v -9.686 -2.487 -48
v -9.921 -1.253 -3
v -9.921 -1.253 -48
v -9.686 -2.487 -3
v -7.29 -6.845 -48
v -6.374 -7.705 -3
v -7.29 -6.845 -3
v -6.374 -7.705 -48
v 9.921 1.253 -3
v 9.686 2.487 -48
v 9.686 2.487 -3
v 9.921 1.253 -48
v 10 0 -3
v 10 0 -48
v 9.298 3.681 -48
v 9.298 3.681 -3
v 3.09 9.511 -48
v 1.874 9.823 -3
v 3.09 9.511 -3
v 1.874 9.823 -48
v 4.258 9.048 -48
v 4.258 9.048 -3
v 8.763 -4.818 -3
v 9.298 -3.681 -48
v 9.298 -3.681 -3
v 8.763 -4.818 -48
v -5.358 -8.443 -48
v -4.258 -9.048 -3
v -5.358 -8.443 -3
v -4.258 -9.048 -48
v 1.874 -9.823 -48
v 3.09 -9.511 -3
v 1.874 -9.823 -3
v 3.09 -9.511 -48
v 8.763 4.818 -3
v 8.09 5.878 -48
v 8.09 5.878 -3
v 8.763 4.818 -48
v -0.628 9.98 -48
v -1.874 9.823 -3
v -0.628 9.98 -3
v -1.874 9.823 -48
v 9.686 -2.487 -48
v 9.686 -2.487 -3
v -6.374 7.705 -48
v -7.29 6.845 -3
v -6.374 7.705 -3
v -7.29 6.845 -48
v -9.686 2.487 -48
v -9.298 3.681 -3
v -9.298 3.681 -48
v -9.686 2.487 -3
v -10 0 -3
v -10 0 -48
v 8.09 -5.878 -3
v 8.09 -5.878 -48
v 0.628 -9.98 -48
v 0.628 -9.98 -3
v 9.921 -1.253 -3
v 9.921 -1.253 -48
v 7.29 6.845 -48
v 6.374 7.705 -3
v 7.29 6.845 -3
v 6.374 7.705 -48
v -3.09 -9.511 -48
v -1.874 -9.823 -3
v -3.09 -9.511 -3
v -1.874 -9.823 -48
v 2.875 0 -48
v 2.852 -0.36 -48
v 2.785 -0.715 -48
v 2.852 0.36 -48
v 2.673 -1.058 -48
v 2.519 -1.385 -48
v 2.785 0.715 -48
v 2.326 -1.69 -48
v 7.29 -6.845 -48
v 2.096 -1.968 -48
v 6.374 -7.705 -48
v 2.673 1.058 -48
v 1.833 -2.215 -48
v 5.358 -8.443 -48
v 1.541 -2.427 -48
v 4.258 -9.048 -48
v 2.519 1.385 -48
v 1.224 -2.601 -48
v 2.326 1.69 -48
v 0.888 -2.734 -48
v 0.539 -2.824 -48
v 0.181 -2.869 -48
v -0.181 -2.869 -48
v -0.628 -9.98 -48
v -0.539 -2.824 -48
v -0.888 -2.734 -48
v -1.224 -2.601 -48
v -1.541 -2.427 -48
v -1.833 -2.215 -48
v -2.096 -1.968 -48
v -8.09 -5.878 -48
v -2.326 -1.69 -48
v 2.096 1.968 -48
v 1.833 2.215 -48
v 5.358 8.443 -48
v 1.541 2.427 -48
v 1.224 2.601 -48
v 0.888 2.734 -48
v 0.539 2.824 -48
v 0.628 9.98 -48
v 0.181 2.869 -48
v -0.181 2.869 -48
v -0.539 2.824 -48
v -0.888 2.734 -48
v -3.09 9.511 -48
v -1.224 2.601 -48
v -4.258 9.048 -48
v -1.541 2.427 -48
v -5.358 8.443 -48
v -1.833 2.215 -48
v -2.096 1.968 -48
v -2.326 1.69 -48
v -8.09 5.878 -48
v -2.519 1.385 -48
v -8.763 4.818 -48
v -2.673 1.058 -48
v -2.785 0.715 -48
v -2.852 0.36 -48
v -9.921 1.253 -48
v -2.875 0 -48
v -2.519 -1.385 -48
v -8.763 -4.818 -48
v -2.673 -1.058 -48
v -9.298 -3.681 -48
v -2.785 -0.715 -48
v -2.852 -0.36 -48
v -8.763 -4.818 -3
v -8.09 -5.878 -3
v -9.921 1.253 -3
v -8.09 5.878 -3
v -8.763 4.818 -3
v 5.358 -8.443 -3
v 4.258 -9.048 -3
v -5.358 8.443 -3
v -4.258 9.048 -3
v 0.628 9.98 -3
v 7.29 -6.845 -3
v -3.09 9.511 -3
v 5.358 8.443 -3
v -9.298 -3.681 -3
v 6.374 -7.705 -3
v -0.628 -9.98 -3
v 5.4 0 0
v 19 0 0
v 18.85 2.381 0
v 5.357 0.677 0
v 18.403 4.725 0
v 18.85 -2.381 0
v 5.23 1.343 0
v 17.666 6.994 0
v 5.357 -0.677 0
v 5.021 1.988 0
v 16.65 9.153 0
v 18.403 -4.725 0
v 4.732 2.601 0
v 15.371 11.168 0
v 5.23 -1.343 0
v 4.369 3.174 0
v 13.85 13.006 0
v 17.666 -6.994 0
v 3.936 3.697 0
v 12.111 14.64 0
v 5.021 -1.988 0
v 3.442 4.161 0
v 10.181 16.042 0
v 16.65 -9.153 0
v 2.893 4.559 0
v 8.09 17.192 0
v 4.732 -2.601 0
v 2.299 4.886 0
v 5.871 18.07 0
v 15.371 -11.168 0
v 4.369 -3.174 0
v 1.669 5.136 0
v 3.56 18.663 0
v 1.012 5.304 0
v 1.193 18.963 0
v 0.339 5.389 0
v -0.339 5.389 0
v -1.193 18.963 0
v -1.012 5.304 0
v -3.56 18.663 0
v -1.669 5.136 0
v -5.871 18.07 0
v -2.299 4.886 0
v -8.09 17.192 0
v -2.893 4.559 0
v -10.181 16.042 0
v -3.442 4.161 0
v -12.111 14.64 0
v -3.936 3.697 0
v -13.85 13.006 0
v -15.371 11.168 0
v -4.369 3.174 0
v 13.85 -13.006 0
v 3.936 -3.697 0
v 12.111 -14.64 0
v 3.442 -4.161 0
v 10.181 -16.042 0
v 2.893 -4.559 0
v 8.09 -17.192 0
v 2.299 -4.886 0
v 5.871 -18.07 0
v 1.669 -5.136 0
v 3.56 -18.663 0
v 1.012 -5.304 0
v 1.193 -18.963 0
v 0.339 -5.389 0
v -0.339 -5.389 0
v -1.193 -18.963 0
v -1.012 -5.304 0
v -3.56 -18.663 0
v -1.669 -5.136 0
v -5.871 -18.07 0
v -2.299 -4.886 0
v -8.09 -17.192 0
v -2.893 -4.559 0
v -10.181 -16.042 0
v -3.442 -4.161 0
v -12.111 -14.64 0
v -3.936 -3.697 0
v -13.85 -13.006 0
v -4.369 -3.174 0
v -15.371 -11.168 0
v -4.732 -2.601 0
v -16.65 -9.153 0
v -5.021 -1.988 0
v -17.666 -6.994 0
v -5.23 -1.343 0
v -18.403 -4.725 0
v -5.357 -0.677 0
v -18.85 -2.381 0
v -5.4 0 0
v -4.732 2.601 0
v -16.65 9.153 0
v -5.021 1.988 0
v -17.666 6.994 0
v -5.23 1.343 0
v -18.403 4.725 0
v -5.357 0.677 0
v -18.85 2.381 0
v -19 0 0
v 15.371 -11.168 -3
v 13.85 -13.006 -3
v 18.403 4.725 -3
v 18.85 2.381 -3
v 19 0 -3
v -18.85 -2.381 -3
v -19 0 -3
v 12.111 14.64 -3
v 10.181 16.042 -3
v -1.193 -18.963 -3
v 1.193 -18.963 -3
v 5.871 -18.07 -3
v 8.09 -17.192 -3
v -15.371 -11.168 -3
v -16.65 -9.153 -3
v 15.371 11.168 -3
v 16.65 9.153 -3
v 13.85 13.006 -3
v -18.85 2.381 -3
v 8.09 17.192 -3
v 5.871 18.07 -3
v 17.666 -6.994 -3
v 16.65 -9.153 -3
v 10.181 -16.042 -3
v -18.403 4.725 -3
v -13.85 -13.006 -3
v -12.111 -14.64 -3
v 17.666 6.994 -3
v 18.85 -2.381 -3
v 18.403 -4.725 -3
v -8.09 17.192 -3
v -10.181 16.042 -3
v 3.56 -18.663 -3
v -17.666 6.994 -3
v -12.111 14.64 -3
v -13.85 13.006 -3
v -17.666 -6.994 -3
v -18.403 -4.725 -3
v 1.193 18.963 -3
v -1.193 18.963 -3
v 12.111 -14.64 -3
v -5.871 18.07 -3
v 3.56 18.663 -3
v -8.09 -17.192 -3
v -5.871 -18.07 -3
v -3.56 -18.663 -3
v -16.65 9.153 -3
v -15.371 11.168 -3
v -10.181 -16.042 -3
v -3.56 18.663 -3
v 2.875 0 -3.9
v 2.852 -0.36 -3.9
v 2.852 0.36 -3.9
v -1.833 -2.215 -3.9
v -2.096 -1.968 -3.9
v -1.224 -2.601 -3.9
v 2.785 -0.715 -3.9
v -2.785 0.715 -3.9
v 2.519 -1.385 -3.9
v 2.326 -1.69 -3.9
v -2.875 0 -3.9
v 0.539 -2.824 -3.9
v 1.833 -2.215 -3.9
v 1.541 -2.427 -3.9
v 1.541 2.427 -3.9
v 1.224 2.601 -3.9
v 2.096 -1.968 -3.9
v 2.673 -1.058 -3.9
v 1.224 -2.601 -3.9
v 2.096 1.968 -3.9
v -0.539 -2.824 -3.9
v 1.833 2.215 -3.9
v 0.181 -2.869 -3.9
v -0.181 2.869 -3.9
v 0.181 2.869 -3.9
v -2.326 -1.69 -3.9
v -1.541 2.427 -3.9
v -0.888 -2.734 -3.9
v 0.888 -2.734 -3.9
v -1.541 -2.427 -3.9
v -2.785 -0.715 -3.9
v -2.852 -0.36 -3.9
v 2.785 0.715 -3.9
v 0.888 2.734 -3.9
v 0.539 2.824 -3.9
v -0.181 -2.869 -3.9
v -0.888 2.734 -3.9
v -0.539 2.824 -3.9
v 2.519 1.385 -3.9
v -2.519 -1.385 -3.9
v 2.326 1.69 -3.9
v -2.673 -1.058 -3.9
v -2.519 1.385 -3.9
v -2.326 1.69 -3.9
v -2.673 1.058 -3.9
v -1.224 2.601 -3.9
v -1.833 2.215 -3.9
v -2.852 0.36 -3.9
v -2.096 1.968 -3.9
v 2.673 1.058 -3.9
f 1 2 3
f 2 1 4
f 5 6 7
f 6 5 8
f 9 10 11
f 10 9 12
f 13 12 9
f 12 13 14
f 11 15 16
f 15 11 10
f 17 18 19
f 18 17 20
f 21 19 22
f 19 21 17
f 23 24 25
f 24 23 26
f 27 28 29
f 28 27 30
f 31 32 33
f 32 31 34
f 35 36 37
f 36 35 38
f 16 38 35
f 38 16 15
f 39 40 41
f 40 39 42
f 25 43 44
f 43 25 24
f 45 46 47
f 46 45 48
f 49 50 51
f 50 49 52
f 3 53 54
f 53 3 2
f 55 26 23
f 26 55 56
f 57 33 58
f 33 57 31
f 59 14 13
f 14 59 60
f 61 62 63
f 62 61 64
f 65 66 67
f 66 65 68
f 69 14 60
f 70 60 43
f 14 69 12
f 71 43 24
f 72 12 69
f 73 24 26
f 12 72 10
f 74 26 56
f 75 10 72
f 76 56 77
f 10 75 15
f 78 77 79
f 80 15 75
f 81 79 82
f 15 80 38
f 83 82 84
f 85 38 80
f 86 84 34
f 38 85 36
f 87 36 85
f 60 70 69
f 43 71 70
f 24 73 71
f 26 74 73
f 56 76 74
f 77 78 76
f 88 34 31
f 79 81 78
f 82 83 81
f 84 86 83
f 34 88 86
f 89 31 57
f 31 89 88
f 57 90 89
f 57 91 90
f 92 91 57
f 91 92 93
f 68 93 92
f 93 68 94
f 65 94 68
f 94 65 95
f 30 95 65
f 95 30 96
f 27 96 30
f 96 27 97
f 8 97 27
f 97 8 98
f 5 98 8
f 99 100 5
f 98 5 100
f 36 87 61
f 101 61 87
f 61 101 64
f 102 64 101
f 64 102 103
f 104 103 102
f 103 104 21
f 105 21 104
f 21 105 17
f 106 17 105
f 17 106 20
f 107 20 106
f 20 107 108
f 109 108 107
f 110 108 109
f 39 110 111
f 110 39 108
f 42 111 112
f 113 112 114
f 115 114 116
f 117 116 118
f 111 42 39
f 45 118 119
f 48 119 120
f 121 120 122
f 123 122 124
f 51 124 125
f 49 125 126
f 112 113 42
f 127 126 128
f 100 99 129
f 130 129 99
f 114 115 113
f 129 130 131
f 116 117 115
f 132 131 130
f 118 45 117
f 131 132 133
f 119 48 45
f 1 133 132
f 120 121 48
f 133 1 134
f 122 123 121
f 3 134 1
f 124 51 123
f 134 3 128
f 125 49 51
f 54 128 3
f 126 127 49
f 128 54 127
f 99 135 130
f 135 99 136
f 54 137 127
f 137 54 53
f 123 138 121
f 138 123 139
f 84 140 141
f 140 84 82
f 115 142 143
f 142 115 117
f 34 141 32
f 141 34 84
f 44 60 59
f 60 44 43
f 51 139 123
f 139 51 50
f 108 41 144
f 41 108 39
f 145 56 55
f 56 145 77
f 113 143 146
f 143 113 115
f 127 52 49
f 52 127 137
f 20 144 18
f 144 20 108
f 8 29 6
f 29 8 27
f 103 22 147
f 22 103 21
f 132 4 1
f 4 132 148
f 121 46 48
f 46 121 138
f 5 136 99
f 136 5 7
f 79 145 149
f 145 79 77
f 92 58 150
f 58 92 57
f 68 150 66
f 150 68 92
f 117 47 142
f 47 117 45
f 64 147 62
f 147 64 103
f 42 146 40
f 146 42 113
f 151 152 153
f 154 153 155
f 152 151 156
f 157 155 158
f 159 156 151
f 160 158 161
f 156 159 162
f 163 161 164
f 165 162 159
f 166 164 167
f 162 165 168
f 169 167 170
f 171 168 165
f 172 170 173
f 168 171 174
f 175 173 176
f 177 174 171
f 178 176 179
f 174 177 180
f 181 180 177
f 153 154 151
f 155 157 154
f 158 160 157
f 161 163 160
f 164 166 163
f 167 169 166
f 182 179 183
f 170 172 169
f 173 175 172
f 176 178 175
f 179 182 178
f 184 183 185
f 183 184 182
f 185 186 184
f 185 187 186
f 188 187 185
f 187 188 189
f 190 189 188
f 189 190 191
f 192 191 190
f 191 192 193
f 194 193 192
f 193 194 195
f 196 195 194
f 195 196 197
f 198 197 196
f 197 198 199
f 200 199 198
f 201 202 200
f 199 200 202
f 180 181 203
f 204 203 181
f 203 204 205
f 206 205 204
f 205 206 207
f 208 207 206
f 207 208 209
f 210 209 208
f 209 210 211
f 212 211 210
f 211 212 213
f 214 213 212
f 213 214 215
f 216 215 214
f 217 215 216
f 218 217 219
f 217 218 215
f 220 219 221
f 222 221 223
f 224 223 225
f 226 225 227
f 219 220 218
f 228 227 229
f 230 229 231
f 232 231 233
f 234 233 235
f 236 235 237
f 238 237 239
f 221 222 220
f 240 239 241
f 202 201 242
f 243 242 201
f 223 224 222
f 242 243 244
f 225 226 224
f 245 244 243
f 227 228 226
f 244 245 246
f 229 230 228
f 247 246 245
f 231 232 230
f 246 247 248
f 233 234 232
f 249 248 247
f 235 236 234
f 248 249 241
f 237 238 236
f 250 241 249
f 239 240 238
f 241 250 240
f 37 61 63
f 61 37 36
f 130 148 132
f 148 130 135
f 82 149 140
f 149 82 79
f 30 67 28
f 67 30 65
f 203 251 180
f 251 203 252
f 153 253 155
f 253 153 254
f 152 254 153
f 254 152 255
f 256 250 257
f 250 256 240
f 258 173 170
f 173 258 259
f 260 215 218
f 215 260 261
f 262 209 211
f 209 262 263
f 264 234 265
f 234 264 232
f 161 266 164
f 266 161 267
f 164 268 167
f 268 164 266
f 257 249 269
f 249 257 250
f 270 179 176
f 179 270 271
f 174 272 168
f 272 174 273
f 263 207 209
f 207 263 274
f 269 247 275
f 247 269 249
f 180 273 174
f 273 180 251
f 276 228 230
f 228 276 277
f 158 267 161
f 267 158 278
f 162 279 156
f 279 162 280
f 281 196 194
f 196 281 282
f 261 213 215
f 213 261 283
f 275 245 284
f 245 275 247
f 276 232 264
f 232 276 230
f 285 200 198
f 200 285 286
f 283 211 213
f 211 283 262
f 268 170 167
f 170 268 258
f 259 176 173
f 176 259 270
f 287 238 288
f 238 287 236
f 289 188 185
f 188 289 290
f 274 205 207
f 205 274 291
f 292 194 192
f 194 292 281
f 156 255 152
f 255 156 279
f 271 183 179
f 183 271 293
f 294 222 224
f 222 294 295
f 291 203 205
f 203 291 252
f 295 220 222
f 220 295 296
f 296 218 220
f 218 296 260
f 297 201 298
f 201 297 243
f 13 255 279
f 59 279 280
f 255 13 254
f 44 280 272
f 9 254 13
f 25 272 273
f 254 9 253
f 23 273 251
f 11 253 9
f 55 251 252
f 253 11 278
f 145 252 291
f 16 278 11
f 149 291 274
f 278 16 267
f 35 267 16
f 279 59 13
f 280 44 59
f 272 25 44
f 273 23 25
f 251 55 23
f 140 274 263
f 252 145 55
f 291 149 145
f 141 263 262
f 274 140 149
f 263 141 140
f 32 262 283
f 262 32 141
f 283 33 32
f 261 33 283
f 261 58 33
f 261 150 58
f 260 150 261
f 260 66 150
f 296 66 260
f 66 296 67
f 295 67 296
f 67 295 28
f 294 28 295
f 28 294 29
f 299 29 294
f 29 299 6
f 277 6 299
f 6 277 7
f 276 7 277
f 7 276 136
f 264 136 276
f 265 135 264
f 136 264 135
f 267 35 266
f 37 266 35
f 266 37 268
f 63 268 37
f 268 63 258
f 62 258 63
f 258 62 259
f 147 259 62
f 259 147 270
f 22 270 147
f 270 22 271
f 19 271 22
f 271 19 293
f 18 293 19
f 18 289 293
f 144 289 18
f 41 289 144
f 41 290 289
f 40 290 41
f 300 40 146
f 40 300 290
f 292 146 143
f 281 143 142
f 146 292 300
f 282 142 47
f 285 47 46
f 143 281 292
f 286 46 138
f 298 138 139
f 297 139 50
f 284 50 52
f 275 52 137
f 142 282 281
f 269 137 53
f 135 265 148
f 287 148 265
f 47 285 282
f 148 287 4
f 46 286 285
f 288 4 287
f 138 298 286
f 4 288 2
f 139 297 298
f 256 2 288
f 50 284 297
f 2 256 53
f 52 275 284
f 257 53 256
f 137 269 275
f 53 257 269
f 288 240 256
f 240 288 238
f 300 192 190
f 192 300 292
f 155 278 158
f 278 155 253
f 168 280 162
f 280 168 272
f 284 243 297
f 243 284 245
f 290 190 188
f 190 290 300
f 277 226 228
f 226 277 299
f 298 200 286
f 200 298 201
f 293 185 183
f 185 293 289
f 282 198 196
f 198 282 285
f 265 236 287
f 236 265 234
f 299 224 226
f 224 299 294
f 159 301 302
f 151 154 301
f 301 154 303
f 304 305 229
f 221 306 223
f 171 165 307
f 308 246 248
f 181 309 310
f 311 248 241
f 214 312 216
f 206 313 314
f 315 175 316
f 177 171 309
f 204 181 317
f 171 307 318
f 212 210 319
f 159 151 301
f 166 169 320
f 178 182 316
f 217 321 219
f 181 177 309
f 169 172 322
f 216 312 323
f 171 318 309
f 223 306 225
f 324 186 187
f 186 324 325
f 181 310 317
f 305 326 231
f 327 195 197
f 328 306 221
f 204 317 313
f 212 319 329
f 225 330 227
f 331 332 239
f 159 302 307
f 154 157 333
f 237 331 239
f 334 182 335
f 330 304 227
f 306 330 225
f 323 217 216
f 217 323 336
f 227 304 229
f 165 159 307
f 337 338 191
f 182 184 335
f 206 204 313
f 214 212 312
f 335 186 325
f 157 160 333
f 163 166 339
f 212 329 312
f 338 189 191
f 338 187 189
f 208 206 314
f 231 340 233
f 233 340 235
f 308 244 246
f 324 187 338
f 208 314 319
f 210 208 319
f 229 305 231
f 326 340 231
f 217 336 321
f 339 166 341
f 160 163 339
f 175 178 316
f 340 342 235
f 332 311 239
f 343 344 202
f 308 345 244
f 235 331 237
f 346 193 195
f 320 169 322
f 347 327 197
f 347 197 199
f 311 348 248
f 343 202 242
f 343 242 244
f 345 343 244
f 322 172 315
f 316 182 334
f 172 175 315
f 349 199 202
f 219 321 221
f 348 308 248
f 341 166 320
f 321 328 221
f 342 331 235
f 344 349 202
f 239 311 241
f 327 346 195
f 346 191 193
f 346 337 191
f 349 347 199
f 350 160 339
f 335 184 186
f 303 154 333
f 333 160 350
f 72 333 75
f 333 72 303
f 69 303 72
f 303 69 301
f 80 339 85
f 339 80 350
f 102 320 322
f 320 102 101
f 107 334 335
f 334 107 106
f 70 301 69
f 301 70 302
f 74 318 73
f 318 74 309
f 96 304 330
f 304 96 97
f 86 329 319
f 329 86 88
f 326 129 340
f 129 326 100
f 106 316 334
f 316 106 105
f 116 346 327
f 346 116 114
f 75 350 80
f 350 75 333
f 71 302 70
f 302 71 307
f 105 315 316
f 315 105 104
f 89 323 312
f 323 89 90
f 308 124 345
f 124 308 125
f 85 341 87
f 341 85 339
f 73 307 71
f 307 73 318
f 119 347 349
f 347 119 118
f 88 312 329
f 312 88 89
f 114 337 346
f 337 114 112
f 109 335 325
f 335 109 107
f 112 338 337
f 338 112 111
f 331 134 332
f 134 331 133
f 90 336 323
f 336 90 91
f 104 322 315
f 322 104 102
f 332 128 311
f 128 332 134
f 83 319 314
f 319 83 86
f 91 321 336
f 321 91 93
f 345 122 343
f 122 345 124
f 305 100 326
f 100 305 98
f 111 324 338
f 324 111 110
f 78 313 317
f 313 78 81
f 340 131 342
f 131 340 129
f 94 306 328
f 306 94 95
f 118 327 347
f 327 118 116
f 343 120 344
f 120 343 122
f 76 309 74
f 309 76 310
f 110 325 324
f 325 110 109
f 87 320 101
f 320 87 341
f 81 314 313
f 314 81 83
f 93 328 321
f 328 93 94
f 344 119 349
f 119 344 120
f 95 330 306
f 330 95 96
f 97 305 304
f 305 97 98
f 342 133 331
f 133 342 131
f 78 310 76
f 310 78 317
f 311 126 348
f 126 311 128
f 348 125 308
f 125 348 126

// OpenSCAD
$fn = 50;


difference() {
	union() {
		translate(v = [0, 0, -48.0000000000]) {
			cylinder(h = 48, r = 10.0000000000);
		}
		translate(v = [0, 0, -3.0000000000]) {
			cylinder(h = 3, r = 19.0000000000);
		}
	}
	union() {
		translate(v = [0, 0, 0]) {
			rotate(a = [0, 0, 0]) {
				difference() {
					union() {
						#translate(v = [0, 0, -48.0000000000]) {
							cylinder(h = 48, r = 2.6000000000);
						}
						#translate(v = [0, 0, -3.9000000000]) {
							cylinder(h = 3.9000000000, r1 = 2.8750000000, r2 = 5.4000000000);
						}
						#translate(v = [0, 0, -48.0000000000]) {
							cylinder(h = 48, r = 2.8750000000);
						}
						#translate(v = [0, 0, -48.0000000000]) {
							cylinder(h = 48, r = 2.6000000000);
						}
					}
					union();
				}
			}
		}
	}
}
